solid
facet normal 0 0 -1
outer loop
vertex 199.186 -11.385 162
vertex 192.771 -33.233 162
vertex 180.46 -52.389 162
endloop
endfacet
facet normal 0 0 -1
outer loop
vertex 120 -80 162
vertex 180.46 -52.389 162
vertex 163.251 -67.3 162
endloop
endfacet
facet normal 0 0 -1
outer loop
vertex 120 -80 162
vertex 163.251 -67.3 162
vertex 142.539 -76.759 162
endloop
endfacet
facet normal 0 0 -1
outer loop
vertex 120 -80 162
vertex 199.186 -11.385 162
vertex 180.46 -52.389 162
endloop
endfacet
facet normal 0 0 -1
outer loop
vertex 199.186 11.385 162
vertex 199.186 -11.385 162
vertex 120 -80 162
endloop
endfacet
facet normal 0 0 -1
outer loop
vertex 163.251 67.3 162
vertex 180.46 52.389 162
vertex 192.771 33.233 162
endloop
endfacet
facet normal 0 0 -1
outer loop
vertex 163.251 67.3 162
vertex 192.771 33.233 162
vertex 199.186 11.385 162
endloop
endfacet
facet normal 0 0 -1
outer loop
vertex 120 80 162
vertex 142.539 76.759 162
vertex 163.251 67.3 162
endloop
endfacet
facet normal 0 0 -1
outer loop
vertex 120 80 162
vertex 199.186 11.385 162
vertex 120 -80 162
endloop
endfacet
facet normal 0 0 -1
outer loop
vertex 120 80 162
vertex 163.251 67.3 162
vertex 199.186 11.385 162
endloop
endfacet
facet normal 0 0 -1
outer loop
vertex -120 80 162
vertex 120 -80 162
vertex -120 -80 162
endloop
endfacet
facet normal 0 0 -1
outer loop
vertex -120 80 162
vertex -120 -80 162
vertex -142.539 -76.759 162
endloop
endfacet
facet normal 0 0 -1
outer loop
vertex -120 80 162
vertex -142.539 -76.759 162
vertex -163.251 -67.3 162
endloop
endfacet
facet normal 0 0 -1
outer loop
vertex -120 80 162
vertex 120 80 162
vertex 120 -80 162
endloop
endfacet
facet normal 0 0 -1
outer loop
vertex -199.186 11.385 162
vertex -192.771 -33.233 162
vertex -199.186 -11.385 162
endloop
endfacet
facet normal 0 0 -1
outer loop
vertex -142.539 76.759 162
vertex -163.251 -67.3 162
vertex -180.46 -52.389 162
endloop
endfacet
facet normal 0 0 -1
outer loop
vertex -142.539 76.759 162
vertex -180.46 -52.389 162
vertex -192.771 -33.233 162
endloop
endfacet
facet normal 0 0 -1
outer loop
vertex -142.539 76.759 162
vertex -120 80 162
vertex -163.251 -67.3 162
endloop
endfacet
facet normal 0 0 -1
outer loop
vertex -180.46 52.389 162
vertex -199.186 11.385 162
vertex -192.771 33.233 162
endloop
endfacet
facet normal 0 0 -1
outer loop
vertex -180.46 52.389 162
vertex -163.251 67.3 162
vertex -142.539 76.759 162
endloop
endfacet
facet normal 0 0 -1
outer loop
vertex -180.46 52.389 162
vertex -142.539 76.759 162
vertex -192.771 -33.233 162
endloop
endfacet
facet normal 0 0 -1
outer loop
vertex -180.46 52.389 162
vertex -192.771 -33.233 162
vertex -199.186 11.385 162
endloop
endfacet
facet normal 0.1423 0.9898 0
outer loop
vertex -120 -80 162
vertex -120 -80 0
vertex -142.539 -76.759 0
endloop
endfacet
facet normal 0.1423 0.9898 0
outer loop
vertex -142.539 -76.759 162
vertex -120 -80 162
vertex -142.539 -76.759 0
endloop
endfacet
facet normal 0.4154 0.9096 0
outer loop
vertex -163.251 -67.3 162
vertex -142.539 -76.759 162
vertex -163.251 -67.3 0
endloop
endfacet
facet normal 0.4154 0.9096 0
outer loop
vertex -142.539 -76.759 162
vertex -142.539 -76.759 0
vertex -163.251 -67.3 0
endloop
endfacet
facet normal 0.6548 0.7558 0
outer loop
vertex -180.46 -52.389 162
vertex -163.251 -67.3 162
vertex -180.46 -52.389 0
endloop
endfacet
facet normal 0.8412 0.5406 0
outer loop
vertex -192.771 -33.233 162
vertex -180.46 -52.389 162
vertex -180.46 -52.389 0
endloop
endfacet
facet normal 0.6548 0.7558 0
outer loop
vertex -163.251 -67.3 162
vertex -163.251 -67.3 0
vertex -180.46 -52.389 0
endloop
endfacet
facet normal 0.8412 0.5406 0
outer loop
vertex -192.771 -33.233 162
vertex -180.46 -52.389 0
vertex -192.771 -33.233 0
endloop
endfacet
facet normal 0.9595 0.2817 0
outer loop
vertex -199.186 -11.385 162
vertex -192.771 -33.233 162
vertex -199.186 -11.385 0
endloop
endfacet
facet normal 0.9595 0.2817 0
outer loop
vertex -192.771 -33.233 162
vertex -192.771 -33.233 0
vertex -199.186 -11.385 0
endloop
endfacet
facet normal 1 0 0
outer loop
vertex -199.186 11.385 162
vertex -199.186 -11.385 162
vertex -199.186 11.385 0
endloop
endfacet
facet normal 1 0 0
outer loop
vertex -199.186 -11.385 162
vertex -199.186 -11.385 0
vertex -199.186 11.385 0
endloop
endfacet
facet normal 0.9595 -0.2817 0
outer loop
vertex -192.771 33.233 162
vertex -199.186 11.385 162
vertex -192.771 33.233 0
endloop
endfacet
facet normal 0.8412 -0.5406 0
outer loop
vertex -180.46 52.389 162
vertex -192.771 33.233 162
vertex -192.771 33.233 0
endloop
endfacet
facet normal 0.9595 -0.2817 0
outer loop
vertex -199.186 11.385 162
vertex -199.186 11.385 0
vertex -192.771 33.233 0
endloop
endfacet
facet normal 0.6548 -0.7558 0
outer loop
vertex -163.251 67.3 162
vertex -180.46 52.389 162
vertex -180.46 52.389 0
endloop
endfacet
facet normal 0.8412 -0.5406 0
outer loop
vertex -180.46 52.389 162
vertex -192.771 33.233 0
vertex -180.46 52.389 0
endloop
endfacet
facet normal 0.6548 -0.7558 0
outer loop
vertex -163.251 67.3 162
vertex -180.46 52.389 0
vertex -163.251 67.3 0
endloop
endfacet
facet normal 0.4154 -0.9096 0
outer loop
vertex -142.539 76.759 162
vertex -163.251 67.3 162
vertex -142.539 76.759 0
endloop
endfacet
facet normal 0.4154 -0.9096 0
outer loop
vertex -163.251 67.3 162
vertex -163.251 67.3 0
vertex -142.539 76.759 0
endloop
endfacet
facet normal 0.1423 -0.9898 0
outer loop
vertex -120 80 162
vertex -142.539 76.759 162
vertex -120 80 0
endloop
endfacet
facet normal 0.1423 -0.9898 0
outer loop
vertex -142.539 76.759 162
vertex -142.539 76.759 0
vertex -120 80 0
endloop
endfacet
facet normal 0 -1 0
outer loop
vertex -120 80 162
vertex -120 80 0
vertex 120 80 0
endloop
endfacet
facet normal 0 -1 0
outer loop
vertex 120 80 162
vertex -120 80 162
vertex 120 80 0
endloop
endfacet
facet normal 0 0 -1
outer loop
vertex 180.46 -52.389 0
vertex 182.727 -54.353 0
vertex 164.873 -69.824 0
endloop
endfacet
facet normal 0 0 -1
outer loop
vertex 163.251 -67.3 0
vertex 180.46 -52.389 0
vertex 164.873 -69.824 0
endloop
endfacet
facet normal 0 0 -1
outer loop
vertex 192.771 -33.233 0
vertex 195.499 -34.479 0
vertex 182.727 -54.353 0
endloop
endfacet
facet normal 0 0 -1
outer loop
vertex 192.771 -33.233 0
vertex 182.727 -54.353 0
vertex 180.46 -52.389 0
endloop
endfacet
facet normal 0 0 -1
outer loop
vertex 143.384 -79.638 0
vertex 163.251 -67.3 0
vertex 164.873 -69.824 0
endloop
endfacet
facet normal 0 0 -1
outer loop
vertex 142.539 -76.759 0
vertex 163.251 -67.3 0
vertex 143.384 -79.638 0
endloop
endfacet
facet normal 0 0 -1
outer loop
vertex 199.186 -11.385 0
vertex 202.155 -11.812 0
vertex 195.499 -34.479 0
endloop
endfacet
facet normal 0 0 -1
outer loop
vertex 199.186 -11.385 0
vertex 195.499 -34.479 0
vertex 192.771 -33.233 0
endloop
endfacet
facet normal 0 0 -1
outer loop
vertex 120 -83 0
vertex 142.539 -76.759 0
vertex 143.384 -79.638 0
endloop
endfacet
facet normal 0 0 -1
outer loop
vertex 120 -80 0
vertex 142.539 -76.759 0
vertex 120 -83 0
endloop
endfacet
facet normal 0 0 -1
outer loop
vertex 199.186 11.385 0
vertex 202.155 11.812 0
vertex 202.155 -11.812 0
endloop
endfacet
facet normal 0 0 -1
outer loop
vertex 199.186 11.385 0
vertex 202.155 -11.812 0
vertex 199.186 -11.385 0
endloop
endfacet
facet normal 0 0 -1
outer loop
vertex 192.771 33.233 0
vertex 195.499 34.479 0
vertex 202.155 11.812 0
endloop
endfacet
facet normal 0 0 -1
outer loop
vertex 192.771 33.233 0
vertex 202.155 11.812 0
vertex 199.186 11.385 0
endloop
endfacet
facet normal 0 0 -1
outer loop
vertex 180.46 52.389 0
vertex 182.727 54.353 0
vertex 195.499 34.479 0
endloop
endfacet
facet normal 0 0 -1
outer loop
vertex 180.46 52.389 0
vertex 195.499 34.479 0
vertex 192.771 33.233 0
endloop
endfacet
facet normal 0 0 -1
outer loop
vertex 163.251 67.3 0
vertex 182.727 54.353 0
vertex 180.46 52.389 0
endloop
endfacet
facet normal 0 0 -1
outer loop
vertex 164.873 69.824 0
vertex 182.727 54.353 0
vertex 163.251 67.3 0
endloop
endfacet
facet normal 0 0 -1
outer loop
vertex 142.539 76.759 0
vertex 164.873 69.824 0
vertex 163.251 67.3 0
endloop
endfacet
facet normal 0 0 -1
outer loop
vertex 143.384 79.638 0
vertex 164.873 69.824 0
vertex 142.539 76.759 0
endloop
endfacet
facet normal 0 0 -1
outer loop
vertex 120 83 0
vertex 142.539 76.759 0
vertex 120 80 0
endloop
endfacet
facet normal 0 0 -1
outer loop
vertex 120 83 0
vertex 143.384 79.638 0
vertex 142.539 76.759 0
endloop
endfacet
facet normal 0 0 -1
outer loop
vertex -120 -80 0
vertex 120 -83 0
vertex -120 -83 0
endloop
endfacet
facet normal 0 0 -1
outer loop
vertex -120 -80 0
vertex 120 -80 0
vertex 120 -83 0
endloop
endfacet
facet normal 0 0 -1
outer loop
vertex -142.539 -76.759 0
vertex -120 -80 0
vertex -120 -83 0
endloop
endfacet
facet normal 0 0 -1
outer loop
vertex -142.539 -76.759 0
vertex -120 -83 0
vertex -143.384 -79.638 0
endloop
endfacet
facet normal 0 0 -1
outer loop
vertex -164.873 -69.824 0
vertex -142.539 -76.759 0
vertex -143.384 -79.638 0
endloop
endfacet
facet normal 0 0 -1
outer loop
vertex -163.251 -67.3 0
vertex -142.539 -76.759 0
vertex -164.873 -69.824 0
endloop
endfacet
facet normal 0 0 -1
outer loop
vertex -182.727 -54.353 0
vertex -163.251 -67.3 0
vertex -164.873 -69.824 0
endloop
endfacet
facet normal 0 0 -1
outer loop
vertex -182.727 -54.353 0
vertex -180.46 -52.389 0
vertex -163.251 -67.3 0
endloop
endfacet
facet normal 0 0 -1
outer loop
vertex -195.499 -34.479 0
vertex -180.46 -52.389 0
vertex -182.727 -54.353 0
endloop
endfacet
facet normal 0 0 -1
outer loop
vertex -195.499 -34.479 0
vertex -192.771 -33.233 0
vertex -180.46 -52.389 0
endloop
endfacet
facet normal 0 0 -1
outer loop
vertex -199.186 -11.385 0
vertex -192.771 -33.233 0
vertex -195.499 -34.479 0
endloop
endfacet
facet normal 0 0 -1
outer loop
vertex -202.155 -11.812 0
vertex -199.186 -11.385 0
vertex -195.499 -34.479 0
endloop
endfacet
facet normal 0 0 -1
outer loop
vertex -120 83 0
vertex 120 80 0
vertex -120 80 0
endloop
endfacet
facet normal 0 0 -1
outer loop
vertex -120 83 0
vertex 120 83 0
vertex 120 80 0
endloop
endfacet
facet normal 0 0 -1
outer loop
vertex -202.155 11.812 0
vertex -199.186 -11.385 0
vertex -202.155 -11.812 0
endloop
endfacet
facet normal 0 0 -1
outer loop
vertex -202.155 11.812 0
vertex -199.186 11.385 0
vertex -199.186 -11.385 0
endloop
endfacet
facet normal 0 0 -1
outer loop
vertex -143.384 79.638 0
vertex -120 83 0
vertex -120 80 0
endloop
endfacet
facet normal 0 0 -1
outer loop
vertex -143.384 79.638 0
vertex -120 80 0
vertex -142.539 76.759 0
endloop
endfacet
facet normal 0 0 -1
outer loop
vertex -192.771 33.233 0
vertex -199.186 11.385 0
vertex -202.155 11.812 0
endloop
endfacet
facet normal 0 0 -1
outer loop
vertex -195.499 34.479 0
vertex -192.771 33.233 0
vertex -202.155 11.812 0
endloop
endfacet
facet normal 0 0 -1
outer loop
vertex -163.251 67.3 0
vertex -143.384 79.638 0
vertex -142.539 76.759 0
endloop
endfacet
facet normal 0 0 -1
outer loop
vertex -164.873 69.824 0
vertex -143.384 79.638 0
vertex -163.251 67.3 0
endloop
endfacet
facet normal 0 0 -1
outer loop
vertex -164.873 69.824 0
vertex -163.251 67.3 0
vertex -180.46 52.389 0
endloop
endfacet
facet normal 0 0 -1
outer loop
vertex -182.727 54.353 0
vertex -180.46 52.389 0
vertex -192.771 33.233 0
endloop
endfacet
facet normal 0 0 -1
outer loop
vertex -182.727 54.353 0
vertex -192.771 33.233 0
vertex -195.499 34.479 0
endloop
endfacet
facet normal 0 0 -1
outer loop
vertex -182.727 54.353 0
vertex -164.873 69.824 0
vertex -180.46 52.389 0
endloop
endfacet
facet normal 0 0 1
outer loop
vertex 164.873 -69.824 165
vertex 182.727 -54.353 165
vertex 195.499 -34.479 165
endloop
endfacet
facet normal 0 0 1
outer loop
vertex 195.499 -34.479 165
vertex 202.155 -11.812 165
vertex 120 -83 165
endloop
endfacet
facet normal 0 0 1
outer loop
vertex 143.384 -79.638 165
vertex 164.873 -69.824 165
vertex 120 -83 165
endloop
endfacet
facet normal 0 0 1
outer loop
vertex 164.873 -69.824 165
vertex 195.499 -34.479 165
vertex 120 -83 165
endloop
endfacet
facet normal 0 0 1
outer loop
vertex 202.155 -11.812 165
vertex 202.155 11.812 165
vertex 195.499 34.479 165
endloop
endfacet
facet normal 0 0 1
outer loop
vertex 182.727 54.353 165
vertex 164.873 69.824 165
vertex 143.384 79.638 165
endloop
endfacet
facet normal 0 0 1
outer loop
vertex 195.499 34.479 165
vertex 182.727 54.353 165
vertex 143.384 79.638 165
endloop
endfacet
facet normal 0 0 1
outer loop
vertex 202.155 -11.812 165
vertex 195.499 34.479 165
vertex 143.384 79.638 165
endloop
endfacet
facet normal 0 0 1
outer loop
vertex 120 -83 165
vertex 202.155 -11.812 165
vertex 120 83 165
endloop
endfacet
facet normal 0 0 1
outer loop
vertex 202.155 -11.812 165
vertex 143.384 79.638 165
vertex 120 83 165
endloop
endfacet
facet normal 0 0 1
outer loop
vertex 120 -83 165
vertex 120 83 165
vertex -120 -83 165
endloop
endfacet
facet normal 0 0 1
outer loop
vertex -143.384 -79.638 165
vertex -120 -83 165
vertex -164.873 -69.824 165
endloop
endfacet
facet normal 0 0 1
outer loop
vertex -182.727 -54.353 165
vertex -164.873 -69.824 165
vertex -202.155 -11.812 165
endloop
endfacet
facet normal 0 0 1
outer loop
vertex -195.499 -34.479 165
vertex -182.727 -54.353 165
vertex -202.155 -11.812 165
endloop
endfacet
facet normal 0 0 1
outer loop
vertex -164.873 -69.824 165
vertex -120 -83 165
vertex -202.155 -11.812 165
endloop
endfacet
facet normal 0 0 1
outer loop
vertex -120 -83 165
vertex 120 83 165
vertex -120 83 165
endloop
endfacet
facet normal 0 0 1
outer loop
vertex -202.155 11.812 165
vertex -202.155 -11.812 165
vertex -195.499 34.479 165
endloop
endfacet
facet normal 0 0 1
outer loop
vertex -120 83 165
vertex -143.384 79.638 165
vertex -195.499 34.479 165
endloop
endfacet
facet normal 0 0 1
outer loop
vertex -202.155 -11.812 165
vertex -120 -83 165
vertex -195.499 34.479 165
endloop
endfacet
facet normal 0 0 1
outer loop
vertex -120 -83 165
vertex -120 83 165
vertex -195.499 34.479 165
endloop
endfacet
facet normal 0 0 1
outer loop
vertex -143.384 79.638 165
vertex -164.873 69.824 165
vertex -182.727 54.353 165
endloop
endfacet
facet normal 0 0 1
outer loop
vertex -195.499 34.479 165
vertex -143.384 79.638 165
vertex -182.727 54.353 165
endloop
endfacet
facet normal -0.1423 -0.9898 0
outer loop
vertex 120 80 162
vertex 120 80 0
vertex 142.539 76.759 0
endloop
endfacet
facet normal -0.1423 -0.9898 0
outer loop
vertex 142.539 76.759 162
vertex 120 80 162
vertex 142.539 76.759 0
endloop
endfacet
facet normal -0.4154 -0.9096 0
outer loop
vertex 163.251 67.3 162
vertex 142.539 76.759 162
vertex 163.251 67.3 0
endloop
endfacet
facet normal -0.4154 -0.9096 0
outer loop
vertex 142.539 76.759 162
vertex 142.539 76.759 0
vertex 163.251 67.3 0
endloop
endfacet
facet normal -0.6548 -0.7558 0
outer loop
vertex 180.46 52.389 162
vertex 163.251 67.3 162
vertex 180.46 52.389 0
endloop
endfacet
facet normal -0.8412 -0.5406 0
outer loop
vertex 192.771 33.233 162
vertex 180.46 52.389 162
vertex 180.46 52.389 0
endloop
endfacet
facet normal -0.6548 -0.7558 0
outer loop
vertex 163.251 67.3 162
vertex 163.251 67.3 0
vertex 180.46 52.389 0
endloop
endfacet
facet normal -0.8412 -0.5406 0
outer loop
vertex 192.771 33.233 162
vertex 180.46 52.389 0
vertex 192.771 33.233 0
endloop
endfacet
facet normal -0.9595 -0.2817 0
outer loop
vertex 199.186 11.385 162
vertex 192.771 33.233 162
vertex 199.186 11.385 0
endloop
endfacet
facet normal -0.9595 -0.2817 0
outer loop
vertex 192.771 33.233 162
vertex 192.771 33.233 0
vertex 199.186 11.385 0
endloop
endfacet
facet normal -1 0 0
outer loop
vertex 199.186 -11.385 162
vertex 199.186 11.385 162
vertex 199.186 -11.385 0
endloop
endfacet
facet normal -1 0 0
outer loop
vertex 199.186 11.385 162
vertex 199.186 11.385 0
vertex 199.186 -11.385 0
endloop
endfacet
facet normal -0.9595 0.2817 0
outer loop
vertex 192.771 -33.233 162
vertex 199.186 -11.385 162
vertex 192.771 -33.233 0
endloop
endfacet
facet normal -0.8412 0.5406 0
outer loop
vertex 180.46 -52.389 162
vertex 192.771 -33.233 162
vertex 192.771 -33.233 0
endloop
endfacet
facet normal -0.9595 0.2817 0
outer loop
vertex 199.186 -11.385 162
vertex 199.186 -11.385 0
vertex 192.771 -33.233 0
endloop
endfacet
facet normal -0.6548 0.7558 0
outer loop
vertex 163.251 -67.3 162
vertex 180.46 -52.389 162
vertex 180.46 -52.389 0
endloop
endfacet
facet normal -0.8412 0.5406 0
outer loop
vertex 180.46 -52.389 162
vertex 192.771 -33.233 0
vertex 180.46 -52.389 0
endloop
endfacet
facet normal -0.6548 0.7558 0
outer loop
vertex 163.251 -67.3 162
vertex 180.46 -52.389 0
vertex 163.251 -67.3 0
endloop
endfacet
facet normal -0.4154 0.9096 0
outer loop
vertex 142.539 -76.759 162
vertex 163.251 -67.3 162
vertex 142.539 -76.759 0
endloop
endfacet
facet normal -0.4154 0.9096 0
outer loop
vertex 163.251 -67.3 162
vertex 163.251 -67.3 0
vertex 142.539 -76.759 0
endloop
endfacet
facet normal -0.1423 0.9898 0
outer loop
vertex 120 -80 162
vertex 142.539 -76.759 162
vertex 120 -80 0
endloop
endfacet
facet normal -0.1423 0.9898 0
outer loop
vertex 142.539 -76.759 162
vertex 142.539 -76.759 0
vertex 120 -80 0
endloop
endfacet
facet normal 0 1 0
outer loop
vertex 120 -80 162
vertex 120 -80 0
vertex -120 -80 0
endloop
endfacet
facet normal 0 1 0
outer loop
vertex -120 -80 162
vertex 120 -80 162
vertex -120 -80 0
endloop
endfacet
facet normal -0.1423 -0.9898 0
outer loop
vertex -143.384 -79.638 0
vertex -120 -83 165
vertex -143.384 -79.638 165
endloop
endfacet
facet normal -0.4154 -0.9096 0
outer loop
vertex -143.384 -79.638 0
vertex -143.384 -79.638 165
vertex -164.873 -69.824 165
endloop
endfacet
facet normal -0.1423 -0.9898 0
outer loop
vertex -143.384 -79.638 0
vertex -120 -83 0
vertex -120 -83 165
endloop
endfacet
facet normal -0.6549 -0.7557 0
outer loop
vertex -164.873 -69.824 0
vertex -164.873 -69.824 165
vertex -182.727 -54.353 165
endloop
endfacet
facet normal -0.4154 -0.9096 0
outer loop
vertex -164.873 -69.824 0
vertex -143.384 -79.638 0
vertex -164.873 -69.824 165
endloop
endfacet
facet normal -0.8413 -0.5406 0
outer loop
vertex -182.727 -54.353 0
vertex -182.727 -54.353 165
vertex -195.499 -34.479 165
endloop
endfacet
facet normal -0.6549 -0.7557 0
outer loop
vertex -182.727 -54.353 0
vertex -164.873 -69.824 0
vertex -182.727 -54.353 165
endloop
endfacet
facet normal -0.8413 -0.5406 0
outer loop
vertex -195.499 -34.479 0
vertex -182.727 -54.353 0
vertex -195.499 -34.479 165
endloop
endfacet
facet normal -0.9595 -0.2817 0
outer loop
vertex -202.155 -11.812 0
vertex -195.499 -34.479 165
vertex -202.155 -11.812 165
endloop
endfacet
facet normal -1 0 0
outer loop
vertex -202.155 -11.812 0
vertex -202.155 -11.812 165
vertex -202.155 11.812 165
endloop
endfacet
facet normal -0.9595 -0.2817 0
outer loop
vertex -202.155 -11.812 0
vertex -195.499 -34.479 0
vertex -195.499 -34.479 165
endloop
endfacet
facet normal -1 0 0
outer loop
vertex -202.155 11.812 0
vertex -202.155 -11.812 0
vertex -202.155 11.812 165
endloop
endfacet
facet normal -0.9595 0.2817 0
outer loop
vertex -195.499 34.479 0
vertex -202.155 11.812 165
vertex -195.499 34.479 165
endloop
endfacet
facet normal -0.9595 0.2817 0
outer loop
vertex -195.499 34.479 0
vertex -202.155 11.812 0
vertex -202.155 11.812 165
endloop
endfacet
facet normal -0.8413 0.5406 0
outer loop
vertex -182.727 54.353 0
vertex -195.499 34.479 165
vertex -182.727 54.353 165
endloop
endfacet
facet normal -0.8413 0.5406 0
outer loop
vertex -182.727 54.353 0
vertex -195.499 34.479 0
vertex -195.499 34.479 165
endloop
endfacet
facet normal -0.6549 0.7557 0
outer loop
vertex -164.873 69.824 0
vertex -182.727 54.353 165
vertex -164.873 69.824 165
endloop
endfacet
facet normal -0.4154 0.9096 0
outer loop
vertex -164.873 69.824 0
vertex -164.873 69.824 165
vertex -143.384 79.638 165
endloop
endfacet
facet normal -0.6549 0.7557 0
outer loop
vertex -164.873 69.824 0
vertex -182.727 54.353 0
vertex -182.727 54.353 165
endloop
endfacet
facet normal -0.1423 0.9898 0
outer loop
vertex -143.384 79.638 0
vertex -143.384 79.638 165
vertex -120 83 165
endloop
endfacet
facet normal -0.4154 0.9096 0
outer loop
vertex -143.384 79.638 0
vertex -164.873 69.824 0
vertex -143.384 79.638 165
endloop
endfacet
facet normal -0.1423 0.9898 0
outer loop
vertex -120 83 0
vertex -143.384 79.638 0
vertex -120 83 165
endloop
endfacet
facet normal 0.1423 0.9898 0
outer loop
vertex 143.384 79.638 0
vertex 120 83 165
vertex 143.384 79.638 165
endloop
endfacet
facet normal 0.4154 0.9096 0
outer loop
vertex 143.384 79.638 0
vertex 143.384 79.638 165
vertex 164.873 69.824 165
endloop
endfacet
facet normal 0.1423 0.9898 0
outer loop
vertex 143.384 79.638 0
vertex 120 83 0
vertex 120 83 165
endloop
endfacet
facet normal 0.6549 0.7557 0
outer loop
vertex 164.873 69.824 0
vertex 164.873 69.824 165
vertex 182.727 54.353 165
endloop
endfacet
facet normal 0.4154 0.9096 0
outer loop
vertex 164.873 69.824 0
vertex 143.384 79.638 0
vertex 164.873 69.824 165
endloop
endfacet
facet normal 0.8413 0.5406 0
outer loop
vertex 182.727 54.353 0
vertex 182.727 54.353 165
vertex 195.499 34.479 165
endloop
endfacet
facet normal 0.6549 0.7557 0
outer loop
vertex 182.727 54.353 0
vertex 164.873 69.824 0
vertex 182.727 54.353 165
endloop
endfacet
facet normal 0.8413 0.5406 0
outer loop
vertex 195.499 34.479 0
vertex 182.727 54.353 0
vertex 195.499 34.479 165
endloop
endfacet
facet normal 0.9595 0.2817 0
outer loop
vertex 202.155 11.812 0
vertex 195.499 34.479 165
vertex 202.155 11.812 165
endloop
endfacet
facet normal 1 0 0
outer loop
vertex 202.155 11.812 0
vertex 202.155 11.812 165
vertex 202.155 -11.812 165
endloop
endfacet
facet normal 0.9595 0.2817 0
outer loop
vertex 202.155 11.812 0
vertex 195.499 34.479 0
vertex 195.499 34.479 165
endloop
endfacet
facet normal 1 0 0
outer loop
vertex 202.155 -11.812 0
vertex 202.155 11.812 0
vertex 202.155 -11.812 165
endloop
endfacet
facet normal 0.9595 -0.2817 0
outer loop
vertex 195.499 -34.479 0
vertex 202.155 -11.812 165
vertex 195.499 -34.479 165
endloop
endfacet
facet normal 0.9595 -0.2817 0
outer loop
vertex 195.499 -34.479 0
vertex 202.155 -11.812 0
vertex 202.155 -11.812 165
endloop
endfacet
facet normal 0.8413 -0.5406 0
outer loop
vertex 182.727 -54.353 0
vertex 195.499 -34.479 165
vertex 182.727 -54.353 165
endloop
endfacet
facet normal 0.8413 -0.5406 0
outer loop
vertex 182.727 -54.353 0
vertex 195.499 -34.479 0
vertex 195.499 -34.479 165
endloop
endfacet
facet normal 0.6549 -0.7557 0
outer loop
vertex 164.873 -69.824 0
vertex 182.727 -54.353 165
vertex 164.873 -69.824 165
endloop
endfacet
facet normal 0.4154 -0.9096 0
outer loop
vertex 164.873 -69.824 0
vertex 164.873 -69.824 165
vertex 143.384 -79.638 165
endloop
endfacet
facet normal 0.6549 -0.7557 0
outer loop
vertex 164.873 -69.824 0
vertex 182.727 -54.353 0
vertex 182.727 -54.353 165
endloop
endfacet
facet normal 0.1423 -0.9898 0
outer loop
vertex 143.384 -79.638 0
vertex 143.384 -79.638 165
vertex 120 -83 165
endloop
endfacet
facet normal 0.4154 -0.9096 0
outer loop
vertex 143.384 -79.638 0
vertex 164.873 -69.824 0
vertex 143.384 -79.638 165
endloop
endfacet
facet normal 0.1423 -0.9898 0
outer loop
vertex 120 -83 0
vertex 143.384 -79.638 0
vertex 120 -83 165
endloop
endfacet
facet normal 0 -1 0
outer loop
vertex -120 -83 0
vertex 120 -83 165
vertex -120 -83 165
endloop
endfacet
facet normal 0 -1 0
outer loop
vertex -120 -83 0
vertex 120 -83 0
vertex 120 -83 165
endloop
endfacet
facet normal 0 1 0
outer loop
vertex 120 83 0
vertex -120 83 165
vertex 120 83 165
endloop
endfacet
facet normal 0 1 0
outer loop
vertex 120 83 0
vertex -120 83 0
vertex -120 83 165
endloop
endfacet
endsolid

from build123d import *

# Parameters (mm, degrees)
BOSS_EXTRU_2_DEPTH = 162
COQUE1_T           = 3


with BuildPart() as part:
    # Esquisse1 → Boss.-Extru.2 (new body)
    with BuildSketch(Plane.XY):
        with BuildLine():
            Line((-120, 80), (120, 80))
            ThreePointArc((120, 80), (200, 0), (120, -80))
            Line((120, -80), (-120, -80))
            ThreePointArc((-120, -80), (-200, 0), (-120, 80))
        make_face()
    extrude(amount=BOSS_EXTRU_2_DEPTH)

    # Coque1
    coque1_openings = [part.faces().sort_by_distance(p)[0] for p in [
        (0, 0, 0),
    ]]
    offset(amount=COQUE1_T, openings=coque1_openings, kind=Kind.INTERSECTION)


solid = part.part
